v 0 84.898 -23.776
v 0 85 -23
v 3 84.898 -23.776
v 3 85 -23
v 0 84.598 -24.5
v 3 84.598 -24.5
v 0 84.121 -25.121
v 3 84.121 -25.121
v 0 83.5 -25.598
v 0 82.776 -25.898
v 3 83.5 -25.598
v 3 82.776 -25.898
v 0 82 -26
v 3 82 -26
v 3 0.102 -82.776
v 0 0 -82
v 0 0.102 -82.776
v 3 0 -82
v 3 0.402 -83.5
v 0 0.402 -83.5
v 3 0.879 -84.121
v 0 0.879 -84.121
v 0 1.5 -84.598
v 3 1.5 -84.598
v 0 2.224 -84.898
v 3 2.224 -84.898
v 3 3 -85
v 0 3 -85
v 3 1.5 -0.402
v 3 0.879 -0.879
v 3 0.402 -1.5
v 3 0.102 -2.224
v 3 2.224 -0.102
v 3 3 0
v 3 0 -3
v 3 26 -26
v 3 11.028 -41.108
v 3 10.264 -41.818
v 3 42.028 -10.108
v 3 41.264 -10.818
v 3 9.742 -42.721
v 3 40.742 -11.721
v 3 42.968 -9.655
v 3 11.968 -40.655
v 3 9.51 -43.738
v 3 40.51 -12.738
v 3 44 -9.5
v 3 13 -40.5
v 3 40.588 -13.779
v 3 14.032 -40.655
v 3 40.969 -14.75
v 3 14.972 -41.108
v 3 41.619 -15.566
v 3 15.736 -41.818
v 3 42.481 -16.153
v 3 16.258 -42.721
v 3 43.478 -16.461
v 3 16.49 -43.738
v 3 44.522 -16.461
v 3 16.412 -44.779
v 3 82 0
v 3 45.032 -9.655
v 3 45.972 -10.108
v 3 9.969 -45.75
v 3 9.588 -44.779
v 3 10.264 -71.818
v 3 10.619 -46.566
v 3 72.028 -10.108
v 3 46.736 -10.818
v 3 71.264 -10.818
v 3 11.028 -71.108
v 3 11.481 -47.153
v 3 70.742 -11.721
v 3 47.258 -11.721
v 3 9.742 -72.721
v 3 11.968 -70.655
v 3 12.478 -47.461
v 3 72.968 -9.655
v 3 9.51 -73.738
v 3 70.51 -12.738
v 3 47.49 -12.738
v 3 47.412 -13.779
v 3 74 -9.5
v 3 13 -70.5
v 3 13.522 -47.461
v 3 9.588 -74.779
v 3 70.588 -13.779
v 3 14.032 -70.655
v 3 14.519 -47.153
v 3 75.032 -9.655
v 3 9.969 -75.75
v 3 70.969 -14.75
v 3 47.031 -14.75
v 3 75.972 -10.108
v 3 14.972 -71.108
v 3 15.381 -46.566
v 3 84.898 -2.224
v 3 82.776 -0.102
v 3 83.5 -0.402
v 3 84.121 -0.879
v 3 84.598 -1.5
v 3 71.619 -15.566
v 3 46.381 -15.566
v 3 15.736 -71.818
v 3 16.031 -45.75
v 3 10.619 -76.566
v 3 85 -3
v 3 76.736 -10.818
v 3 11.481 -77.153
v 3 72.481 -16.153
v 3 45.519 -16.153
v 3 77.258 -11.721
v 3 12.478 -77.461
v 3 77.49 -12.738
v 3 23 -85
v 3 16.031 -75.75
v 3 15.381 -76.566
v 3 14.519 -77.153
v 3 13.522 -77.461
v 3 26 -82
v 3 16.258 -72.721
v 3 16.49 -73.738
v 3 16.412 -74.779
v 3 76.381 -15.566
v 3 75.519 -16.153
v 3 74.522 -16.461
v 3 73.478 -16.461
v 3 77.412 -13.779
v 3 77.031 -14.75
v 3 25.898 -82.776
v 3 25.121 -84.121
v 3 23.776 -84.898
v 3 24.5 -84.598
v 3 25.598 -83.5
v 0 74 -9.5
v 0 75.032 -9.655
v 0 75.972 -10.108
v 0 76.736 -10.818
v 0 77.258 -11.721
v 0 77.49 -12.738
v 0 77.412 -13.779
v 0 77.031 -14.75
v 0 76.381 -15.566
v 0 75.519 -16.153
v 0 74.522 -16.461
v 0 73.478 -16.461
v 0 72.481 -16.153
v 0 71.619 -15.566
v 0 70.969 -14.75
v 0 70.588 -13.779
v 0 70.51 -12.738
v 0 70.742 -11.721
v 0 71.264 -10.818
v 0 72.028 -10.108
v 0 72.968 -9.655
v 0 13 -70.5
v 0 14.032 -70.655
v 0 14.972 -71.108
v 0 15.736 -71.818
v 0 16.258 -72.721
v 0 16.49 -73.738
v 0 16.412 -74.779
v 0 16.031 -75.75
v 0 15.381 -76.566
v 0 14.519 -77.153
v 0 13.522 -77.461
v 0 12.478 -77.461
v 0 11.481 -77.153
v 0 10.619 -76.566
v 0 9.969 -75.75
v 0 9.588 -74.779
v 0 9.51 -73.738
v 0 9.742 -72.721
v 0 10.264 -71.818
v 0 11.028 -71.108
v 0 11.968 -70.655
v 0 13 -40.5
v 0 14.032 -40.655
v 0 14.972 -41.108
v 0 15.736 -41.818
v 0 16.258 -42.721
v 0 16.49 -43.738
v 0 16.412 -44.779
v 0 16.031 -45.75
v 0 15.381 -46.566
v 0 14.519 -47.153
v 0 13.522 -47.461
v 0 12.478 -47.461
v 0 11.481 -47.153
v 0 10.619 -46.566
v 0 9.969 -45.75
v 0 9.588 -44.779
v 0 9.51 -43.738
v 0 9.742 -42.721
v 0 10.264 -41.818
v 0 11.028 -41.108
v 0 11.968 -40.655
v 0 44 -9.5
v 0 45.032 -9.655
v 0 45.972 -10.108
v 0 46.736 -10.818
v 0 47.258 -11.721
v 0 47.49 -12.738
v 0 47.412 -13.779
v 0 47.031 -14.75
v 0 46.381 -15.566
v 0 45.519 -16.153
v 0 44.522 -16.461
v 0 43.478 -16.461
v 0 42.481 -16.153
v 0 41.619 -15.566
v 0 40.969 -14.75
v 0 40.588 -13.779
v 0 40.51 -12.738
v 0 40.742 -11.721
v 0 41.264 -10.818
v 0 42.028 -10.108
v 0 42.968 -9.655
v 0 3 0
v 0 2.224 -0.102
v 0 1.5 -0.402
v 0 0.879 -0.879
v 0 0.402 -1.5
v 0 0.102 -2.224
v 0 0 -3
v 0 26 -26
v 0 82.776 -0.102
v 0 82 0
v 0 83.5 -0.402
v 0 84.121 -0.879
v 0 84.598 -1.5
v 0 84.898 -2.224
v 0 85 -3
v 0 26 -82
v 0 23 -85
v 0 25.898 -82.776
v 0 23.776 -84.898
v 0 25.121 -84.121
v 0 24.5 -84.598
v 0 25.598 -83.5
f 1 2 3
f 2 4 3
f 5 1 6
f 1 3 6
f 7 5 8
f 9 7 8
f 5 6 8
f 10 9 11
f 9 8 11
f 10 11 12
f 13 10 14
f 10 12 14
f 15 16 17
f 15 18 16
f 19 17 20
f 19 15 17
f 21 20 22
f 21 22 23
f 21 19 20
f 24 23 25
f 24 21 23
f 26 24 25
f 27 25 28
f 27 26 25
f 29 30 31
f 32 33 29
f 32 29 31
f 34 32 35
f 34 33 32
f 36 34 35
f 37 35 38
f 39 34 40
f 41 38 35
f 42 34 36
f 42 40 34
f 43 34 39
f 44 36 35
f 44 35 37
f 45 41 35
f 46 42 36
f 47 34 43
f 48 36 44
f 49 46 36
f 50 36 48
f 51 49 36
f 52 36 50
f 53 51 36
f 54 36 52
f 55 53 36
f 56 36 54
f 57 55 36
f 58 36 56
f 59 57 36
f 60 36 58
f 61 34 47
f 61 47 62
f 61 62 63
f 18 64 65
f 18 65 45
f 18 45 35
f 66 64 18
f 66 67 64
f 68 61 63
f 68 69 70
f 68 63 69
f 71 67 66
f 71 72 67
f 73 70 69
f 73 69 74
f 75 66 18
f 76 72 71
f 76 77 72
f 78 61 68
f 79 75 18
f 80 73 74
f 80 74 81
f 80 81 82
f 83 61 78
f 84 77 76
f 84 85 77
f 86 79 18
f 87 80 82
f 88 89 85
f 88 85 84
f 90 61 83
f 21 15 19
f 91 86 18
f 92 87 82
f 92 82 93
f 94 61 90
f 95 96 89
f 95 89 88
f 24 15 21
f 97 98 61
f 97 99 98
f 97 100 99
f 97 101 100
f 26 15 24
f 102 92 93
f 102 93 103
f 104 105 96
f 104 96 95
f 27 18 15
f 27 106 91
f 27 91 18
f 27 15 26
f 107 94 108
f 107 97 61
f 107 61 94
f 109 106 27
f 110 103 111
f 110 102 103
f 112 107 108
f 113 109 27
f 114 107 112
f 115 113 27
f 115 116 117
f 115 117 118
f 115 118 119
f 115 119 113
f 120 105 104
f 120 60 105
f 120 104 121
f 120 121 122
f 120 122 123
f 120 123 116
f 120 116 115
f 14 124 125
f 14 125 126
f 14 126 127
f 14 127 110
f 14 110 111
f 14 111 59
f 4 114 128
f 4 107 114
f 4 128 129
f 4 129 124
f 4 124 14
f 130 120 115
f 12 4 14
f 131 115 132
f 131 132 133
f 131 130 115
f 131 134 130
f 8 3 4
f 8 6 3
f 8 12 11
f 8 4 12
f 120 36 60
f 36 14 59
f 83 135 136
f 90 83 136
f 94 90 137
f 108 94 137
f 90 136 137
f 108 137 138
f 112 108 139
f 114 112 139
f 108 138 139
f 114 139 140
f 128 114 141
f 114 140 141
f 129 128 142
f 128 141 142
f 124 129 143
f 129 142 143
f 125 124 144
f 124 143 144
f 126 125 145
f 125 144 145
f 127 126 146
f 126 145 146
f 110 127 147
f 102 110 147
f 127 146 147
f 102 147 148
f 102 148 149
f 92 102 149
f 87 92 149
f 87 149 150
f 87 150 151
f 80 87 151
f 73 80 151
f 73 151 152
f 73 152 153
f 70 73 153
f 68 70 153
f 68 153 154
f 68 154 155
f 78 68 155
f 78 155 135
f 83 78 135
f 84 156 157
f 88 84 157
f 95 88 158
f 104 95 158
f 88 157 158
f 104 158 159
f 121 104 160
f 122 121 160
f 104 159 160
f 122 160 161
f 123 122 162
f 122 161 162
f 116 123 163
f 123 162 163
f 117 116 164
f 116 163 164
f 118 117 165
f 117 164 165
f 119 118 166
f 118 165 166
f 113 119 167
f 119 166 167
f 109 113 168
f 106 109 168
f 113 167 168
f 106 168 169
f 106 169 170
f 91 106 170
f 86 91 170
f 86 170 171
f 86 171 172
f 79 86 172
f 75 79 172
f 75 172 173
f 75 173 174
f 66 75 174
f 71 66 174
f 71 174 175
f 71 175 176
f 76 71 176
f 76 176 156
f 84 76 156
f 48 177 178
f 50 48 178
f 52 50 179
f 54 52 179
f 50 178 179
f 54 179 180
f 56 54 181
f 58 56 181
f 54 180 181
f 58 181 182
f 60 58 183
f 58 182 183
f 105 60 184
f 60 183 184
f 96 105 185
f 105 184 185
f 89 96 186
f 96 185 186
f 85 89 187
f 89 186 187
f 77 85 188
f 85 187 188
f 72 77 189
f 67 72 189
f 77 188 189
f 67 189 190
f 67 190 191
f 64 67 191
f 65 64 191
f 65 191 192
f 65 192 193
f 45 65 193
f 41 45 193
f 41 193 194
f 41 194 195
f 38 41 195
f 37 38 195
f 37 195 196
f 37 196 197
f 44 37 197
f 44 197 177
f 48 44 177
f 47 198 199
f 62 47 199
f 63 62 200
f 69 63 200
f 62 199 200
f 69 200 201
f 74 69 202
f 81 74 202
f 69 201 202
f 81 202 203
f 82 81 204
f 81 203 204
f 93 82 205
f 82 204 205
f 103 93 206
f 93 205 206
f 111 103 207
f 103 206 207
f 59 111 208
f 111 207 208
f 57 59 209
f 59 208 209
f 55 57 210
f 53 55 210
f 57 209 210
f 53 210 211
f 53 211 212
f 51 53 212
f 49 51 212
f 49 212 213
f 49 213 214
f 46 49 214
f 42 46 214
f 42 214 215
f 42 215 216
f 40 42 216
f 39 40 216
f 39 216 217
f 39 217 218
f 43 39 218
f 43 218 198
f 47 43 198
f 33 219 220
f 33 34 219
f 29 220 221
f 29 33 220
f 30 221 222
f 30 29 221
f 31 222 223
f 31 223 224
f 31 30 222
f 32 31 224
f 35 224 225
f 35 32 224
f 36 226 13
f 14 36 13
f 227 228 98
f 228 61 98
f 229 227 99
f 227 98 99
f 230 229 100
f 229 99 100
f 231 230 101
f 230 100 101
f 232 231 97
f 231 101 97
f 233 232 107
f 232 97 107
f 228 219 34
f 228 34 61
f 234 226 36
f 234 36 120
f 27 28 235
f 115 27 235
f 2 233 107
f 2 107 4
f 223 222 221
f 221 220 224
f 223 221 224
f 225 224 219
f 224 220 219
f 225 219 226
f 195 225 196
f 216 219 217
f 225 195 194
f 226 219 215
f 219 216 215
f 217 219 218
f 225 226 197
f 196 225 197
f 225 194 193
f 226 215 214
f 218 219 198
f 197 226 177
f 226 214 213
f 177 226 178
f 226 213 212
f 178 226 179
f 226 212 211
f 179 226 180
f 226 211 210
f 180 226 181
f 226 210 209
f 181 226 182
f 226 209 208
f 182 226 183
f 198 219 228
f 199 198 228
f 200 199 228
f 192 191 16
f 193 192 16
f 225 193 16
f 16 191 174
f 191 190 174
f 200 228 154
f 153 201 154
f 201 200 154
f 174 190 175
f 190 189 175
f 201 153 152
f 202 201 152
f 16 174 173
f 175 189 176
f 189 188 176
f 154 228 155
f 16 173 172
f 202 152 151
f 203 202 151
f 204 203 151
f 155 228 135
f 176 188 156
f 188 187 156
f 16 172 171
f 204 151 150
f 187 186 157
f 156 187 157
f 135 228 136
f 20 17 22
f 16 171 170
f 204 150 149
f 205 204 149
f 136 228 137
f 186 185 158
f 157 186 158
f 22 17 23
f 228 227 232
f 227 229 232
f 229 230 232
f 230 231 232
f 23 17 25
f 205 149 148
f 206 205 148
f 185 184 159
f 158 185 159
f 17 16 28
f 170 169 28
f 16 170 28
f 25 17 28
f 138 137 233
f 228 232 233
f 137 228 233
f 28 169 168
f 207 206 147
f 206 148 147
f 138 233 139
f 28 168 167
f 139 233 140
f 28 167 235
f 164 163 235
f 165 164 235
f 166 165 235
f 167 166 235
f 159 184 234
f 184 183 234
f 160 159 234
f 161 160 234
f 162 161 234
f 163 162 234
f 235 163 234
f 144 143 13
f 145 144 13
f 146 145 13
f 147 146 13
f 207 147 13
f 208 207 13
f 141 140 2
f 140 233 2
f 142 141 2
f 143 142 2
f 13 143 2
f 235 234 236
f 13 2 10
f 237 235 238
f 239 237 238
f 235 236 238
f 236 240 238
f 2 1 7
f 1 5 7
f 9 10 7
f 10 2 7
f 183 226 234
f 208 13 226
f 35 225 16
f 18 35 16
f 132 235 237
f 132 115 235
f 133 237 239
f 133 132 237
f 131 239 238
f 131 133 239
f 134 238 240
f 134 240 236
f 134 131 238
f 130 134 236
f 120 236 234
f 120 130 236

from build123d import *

# Parameters (mm, degrees)
SKETCH1_W           = 85
SKETCH1_H           = 85
BOSS_EXTRUDE1_DEPTH = 3
SKETCH2_W           = 59
SKETCH2_H           = 59
CUT_EXTRUDE1_DEPTH  = 4
DIAMETERHOLE1_D     = 7
FILLET1_R           = 3


with BuildPart() as part:
    # Sketch1 → Boss-Extrude1 (new body)
    with BuildSketch(Plane(origin=(0, 0, 0), x_dir=(0, 0, -1), z_dir=(1, 0, 0))):
        with Locations((42.5, 42.5)):
            Rectangle(SKETCH1_W, SKETCH1_H)
    extrude(amount=BOSS_EXTRUDE1_DEPTH)

    # Sketch2 → Cut-Extrude1 (cut, through all)
    with BuildSketch(Plane(origin=(0, 0, 0), x_dir=(0, 0, -1), z_dir=(1, 0, 0))):
        with Locations((55.5, 55.5)):
            Rectangle(SKETCH2_W, SKETCH2_H)
    extrude(amount=CUT_EXTRUDE1_DEPTH, mode=Mode.SUBTRACT)

    # DiameterHole1 (through all)
    with Locations(Plane(origin=(3, 0, 0), x_dir=(0, 0, -1), z_dir=(1, 0, 0))):
        with Locations((13, 74), (13, 44), (74, 13), (44, 13)):
            Hole(DIAMETERHOLE1_D / 2)

    # Fillet1
    fillet1_edges = [part.edges().sort_by_distance(p)[0] for p in [
        (1.5, 85, -26),
        (1.5, 26, -85),
        (1.5, 0, -85),
        (1.5, 0, 0),
        (1.5, 85, 0),
    ]]
    fillet(fillet1_edges, radius=FILLET1_R)


solid = part.part
